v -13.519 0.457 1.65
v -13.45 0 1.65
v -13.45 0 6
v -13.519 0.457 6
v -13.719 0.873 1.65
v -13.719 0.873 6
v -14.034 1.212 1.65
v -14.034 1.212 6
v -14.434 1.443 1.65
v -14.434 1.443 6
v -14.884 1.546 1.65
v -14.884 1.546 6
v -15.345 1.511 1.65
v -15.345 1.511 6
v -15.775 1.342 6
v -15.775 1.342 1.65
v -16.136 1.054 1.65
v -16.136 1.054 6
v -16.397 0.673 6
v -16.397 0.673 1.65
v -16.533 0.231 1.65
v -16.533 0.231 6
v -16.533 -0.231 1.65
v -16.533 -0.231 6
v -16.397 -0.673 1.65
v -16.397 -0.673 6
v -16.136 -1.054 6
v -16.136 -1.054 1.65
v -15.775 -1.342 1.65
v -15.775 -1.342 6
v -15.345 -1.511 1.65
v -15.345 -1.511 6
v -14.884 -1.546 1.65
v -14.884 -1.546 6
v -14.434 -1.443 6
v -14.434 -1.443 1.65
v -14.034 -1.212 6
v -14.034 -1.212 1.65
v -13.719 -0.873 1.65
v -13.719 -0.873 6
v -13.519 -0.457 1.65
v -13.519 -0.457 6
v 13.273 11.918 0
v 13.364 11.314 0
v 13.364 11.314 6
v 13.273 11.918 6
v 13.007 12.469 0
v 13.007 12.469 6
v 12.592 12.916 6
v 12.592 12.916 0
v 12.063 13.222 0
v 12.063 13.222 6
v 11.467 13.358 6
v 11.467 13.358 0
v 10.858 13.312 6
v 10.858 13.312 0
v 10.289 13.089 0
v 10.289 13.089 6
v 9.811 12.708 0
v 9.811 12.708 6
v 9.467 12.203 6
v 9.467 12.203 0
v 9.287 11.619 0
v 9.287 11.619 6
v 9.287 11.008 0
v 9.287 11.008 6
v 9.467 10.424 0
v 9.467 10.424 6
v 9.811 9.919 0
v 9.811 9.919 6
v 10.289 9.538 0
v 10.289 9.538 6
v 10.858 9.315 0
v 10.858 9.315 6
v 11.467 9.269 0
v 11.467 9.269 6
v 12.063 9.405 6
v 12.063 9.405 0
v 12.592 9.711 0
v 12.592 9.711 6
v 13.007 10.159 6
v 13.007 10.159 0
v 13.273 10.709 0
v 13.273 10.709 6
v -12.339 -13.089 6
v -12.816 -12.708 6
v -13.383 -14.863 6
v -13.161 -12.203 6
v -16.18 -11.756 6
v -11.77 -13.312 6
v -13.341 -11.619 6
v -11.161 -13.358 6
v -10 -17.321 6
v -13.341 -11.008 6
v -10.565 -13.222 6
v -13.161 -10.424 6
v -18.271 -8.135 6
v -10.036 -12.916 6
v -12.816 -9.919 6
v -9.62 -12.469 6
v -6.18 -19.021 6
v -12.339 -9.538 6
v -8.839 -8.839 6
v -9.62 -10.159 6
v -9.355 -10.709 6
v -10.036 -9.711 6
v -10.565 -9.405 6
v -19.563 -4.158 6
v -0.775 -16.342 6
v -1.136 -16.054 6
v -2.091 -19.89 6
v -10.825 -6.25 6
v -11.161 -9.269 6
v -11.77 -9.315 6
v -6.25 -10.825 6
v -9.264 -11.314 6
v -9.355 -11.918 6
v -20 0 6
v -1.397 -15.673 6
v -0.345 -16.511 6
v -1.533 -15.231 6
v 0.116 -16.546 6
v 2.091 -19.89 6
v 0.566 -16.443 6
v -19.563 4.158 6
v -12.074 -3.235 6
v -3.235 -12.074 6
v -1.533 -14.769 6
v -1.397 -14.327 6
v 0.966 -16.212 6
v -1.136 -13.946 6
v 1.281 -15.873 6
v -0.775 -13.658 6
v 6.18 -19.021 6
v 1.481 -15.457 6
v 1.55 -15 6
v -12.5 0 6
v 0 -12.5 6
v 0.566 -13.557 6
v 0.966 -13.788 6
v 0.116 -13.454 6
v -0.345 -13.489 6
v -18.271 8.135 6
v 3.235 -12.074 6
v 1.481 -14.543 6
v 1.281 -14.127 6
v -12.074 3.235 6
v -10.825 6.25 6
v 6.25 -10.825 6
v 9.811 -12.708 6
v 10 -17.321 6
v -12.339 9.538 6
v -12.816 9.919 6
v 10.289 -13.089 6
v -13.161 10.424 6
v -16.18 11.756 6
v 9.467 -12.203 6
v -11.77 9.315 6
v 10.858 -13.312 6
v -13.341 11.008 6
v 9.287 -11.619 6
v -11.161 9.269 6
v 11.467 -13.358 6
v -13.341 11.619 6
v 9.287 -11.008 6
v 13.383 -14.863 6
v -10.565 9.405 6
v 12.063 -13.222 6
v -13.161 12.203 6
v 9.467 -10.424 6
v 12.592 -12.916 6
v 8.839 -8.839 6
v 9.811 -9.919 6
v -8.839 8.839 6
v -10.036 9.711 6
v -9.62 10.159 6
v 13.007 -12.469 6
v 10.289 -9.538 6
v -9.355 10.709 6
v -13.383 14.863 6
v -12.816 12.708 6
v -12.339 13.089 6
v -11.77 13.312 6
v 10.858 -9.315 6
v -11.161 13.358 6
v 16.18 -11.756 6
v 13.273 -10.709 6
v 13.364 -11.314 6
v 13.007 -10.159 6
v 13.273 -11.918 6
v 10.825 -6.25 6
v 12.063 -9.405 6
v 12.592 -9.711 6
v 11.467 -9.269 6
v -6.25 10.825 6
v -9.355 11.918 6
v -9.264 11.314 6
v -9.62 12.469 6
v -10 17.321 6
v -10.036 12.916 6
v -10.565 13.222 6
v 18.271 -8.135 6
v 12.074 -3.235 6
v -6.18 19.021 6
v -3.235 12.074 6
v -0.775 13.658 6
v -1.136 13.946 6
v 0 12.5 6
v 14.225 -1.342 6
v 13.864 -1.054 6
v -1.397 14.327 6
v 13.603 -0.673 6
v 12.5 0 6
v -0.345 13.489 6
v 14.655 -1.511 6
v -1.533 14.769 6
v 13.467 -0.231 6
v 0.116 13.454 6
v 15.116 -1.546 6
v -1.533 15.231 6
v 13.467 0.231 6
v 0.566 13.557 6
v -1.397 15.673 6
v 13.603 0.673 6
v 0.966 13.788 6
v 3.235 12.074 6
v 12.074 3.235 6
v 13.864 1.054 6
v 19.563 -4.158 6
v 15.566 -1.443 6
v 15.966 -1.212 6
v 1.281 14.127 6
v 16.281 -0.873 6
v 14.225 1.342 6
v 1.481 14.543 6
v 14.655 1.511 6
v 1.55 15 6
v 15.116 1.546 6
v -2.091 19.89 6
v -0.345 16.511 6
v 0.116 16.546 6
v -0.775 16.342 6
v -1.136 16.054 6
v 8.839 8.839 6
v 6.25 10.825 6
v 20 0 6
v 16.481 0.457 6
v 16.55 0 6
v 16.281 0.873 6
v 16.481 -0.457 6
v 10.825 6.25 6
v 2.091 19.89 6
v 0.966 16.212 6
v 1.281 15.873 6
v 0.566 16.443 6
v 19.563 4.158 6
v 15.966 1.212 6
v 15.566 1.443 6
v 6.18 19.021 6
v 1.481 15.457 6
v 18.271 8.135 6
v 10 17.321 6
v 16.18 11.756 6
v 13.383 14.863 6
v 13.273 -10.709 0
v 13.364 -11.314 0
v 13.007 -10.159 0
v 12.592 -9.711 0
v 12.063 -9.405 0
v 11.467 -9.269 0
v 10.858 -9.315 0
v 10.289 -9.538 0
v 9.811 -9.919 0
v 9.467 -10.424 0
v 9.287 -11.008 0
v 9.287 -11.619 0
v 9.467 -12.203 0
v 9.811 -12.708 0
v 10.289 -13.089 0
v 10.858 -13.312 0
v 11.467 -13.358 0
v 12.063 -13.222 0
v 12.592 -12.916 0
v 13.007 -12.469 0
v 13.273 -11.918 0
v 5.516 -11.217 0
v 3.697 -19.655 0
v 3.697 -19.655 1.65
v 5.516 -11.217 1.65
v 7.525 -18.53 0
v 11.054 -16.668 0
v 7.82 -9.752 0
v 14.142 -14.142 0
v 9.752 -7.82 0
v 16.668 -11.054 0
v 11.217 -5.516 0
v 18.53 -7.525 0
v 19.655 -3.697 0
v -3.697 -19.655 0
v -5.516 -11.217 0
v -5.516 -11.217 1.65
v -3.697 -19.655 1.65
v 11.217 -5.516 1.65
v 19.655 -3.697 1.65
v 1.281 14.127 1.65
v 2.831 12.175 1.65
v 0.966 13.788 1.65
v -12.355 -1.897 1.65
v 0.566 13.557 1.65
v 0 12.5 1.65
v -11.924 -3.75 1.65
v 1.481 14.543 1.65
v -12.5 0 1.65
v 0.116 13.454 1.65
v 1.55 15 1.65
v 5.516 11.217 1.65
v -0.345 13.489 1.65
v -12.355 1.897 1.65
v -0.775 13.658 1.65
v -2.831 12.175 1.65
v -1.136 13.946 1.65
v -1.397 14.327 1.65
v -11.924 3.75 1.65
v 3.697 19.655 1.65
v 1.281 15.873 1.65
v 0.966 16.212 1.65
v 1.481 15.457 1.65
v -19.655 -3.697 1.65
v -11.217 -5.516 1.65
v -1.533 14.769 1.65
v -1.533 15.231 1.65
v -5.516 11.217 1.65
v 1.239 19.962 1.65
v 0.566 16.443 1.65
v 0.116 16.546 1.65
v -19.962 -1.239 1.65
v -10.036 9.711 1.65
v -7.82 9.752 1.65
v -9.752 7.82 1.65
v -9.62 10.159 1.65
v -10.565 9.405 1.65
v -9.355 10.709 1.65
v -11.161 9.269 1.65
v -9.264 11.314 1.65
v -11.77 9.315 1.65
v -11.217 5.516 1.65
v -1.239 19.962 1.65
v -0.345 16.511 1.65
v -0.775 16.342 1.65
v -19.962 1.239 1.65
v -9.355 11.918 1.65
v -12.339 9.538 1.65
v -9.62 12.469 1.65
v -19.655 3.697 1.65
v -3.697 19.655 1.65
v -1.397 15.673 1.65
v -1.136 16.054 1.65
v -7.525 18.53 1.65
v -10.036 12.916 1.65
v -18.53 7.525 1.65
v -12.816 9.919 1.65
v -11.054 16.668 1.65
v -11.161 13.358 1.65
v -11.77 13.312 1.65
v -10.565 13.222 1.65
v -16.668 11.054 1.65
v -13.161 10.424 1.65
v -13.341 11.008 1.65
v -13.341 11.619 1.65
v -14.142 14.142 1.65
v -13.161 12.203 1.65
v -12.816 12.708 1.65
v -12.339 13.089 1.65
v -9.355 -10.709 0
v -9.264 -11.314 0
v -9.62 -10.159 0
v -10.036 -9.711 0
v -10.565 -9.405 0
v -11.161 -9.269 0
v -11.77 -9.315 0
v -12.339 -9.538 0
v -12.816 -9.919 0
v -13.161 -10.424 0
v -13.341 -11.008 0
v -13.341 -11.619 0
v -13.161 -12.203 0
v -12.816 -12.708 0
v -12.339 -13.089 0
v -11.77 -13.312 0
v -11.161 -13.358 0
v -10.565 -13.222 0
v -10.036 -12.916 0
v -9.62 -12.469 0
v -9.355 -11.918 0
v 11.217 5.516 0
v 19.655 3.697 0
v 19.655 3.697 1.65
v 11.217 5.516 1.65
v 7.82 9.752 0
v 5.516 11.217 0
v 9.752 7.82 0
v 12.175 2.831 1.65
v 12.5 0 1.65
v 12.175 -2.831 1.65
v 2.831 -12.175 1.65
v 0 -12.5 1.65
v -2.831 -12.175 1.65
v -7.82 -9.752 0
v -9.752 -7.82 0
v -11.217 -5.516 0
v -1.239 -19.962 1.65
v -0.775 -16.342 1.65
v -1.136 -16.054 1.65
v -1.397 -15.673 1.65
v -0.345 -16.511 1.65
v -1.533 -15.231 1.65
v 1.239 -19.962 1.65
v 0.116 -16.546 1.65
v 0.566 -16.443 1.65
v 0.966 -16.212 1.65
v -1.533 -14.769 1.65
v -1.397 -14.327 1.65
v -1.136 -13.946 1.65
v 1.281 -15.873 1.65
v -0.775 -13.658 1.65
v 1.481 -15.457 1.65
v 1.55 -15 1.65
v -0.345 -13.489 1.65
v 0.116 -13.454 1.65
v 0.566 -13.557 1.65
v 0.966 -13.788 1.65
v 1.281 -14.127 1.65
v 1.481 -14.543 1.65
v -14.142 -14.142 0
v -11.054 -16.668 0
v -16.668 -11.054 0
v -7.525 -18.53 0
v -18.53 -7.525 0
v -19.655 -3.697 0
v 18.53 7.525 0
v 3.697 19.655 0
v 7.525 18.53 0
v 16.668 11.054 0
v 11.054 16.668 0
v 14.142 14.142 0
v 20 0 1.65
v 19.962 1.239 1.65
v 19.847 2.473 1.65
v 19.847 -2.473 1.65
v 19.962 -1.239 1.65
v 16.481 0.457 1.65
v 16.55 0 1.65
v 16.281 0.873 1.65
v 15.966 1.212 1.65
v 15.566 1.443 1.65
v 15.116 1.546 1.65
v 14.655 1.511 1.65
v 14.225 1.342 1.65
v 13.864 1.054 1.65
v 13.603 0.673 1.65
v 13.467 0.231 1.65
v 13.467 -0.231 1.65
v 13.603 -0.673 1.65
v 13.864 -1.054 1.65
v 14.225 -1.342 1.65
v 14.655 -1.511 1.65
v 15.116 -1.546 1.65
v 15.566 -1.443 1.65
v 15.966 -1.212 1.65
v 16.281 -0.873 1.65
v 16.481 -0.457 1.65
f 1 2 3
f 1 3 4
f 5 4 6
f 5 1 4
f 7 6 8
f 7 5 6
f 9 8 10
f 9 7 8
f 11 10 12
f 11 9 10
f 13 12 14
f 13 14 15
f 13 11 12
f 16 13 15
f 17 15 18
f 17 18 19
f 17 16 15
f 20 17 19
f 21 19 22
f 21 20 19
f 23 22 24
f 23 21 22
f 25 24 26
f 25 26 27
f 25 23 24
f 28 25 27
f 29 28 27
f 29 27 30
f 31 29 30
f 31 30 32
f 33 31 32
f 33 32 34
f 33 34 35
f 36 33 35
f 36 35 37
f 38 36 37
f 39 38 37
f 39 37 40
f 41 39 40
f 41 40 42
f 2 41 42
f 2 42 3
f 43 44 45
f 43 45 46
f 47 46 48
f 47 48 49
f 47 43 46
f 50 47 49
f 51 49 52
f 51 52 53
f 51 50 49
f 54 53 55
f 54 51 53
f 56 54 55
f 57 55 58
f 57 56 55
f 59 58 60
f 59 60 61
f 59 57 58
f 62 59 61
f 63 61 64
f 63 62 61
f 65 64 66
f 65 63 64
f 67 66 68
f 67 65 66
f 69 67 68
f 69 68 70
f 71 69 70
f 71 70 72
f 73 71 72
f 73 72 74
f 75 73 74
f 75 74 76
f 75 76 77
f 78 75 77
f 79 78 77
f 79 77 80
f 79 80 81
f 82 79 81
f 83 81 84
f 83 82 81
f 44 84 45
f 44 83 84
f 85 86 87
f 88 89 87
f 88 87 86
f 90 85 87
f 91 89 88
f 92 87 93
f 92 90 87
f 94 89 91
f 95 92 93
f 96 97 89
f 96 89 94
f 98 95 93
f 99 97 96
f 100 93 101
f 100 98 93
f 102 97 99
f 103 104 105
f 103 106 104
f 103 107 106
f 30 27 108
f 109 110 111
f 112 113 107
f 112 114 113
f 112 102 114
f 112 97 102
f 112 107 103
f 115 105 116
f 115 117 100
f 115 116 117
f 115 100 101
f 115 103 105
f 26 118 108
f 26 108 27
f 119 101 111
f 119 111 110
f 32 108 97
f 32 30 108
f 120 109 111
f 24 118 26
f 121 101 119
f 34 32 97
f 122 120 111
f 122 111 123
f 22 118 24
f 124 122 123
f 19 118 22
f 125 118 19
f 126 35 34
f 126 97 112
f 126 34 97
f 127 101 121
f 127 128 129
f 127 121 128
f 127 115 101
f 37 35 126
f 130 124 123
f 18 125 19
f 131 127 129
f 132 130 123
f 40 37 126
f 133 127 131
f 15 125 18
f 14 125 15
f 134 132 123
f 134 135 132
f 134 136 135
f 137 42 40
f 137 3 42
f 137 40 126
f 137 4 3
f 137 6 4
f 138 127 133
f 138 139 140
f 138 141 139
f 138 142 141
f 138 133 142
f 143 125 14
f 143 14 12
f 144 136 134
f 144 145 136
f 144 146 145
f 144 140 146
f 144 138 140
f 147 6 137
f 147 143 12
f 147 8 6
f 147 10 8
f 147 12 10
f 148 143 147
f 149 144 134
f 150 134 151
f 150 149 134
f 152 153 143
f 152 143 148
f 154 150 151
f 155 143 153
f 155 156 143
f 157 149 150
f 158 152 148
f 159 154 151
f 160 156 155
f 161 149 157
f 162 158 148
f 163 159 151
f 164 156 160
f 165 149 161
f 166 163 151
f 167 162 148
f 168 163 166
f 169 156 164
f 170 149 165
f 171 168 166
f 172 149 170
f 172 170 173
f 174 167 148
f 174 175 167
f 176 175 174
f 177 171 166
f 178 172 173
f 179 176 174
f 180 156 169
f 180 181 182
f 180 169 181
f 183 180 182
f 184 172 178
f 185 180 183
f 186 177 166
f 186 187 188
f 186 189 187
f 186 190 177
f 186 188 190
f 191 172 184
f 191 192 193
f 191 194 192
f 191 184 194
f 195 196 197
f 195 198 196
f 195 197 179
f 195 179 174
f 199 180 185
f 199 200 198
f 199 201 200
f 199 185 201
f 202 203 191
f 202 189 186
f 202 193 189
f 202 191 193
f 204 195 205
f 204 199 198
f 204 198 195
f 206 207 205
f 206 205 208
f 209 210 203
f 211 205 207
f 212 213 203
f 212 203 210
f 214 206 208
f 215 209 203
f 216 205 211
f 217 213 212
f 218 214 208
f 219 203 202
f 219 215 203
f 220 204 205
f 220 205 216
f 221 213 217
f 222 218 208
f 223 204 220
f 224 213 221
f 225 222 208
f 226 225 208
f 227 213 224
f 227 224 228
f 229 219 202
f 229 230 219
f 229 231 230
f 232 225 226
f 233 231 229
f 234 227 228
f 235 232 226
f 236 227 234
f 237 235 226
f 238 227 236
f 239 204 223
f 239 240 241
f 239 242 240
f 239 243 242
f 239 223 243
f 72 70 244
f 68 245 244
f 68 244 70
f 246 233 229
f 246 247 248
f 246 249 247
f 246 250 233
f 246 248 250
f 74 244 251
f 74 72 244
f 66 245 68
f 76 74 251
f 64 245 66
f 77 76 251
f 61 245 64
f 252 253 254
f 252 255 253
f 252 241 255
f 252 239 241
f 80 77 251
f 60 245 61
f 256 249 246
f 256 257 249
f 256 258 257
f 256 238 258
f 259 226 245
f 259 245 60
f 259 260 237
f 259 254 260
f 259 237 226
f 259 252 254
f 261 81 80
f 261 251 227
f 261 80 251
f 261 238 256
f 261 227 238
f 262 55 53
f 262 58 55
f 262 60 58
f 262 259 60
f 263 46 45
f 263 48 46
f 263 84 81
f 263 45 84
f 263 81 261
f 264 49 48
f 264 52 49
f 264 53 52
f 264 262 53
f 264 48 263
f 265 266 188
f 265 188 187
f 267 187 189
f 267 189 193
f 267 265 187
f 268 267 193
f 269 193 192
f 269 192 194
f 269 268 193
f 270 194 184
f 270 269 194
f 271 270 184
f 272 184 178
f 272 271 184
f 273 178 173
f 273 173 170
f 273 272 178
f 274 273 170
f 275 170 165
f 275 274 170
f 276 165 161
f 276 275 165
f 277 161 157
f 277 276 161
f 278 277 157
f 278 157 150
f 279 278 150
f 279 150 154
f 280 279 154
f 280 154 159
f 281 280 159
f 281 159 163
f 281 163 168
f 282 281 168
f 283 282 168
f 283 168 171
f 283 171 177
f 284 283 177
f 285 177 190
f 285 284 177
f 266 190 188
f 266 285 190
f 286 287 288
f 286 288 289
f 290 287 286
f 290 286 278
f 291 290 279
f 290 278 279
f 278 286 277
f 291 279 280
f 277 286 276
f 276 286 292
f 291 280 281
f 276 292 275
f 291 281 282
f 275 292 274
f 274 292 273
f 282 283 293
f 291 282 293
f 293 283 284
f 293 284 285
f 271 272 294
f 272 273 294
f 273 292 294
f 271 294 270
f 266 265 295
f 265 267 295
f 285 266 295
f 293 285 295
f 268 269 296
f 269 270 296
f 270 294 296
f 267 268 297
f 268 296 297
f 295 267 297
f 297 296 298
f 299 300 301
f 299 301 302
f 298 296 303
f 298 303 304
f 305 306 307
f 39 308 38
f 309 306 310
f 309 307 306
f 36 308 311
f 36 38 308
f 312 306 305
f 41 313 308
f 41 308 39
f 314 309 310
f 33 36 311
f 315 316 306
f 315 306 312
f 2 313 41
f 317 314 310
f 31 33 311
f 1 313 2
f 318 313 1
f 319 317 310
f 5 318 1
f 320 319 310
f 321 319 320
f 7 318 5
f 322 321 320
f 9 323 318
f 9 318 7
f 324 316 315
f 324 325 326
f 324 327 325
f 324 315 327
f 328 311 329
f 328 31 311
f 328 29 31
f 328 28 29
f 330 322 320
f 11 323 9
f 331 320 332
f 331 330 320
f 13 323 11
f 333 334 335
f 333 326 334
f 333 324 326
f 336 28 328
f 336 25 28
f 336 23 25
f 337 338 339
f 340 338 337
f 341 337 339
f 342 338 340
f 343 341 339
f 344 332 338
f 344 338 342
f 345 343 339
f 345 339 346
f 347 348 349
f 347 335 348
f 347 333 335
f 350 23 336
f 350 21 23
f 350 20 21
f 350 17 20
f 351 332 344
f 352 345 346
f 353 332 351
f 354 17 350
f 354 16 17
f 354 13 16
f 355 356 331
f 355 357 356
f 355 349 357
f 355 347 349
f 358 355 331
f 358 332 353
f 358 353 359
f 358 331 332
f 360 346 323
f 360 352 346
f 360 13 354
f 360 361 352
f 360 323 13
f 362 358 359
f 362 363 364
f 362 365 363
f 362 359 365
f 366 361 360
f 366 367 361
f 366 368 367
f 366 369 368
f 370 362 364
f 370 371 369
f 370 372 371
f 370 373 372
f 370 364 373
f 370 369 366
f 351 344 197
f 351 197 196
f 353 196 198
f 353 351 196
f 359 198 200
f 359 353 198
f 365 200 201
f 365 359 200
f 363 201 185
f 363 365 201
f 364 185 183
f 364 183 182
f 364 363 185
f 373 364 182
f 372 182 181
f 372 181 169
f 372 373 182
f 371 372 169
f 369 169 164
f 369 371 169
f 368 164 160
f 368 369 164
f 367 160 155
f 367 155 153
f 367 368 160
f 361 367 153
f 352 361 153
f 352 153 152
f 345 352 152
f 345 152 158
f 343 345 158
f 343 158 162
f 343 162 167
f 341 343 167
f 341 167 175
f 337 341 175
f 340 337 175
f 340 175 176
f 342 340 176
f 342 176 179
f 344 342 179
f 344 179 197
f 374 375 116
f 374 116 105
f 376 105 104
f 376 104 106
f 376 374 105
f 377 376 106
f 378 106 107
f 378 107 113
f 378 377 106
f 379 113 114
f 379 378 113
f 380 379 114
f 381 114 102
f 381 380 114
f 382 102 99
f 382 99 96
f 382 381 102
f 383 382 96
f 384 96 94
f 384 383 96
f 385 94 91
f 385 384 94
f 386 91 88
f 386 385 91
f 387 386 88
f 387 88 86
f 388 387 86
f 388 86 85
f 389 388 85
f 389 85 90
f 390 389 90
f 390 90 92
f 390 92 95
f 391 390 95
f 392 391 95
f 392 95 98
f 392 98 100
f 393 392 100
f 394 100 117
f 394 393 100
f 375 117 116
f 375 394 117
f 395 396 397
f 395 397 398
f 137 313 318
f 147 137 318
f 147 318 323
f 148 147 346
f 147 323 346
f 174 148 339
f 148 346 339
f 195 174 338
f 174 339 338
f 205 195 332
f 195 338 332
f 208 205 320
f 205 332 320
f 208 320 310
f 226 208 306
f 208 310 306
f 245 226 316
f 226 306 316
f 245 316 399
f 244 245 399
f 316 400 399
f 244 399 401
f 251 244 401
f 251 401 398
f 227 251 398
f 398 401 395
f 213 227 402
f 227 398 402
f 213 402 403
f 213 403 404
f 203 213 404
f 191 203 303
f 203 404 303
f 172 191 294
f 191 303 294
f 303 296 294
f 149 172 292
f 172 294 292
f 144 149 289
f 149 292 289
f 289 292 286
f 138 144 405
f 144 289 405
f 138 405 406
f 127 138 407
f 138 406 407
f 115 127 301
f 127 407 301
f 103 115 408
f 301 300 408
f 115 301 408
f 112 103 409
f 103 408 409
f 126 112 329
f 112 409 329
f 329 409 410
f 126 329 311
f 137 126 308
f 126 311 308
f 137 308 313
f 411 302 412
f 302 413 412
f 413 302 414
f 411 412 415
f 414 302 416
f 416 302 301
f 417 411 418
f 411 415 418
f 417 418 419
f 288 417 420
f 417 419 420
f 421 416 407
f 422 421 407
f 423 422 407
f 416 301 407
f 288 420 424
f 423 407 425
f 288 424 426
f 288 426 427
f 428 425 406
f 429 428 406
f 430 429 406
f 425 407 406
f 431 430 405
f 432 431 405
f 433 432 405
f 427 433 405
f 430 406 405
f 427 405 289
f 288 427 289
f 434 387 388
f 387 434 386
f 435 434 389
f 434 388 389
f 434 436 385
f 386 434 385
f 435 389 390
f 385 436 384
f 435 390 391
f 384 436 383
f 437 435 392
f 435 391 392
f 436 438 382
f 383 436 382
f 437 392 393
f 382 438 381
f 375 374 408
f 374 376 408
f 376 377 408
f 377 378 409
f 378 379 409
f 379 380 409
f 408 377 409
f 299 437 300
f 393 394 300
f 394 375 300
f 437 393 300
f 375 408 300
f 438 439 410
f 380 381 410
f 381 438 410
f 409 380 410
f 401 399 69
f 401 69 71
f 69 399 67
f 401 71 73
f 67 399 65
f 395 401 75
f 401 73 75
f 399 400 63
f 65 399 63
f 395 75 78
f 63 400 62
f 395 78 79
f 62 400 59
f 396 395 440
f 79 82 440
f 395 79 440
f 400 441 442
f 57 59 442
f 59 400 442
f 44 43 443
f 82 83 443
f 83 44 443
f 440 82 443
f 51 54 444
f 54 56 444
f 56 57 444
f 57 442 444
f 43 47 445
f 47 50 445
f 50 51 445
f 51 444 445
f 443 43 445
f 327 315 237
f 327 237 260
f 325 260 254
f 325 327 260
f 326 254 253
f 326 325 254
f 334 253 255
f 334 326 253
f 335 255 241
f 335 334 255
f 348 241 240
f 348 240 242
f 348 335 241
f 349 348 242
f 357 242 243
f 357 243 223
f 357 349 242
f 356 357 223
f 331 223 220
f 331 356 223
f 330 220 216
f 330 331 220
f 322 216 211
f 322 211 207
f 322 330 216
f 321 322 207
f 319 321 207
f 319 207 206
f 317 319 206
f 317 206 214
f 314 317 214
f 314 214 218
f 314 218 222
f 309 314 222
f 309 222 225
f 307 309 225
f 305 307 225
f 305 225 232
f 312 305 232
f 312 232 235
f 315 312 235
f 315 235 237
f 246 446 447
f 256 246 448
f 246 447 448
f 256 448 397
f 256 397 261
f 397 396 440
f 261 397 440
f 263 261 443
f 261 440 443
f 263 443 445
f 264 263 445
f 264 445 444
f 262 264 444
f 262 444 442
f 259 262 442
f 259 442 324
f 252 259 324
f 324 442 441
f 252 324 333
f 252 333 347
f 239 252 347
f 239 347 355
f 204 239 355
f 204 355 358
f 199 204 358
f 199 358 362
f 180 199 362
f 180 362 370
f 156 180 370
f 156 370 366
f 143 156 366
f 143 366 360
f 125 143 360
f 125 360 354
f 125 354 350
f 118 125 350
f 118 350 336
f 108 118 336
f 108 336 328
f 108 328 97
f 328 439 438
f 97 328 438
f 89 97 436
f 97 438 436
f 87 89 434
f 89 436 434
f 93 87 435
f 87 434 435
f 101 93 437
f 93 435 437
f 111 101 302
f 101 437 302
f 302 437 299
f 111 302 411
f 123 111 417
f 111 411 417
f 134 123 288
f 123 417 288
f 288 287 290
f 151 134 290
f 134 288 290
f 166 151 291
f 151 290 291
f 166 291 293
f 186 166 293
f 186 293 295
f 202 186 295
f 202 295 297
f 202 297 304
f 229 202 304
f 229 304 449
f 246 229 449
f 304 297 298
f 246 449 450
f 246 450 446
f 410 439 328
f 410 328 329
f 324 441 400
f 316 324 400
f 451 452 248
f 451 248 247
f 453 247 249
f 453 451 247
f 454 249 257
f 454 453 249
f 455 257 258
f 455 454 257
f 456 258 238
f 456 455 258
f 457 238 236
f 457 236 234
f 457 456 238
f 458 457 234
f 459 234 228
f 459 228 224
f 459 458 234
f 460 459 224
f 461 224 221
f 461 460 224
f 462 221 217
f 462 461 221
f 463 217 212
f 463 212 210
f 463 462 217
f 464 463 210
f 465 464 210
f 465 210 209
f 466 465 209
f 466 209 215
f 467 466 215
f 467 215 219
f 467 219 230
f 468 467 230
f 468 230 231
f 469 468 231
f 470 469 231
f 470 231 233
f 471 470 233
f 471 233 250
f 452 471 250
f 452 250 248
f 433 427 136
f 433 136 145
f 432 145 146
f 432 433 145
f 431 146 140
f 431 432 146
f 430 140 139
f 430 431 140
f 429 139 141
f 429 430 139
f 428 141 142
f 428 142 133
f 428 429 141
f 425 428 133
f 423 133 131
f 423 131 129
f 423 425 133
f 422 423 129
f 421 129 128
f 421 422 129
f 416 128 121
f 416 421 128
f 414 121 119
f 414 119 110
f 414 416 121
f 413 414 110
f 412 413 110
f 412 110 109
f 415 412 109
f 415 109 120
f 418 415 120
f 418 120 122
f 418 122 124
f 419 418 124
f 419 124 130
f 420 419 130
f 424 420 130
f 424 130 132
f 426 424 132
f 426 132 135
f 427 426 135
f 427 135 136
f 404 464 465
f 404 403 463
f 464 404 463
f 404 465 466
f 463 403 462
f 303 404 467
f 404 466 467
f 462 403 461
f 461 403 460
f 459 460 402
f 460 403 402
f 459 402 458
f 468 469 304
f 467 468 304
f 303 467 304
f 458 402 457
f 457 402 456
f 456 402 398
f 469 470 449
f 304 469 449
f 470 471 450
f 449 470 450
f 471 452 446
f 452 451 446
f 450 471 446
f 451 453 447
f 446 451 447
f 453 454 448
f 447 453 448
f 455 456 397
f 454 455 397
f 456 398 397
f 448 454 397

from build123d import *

# Parameters (mm, degrees)
SKETCH_1_R          = 20
SKETCH_1_R_2        = 1.55
SKETCH_1_R_3        = 2.05
EXTRUDE_1_DEPTH     = 6
SKETCH_2_R          = 12.5
CUT_EXTRUDE_1_DEPTH = 31
CUT_EXTRUDE_2_DEPTH = 1.65
CUT_EXTRUDE_3_DEPTH = 1.65


with BuildPart() as part:
    # 草图1 → 凸台-拉伸1 (new body)
    with BuildSketch(Plane.XY):
        Circle(SKETCH_1_R)
        with Locations((0, 15)):
            Circle(SKETCH_1_R_2, mode=Mode.SUBTRACT)
        with Locations((15, 0)):
            Circle(SKETCH_1_R_2, mode=Mode.SUBTRACT)
        with Locations((0, -15)):
            Circle(SKETCH_1_R_2, mode=Mode.SUBTRACT)
        with Locations((-15, 0)):
            Circle(SKETCH_1_R_2, mode=Mode.SUBTRACT)
        with Locations((-11.313708499, 11.313708499)):
            Circle(SKETCH_1_R_3, mode=Mode.SUBTRACT)
        with Locations((11.313708499, 11.313708499)):
            Circle(SKETCH_1_R_3, mode=Mode.SUBTRACT)
        with Locations((11.313708499, -11.313708499)):
            Circle(SKETCH_1_R_3, mode=Mode.SUBTRACT)
        with Locations((-11.313708499, -11.313708499)):
            Circle(SKETCH_1_R_3, mode=Mode.SUBTRACT)
    extrude(amount=EXTRUDE_1_DEPTH)

    # 草图2 → 切除-拉伸1 (cut)
    with BuildSketch(Plane(origin=(0, 0, 0), x_dir=(-1, 0, 0), z_dir=(0, 0, -1))):
        Circle(SKETCH_2_R)
    extrude(amount=-CUT_EXTRUDE_1_DEPTH, mode=Mode.SUBTRACT)

    # 草图4 → 切除-拉伸2 (cut)
    with BuildSketch(Plane(origin=(0, 0, 0), x_dir=(-1, 0, 0), z_dir=(0, 0, -1))):
        with BuildLine():
            Line((-3.697159098, 19.655304999), (-5.515511779, 11.217358415))
            ThreePointArc((-5.515511779, 11.217358415), (0, 12.5), (5.515511779, 11.217358415))
            Line((5.515511779, 11.217358415), (3.697159098, 19.655304999))
            ThreePointArc((3.697159098, 19.655304999), (0, 20), (-3.697159098, 19.655304999))
        make_face()
        with BuildLine():
            Line((19.655304999, -3.697159098), (11.217358415, -5.515511779))
            ThreePointArc((11.217358415, -5.515511779), (12.5, 0), (11.217358415, 5.515511779))
            Line((11.217358415, 5.515511779), (19.655304999, 3.697159098))
            ThreePointArc((19.655304999, 3.697159098), (20, 0), (19.655304999, -3.697159098))
        make_face()
        with BuildLine():
            Line((-3.697159098, -19.655304999), (-5.515511779, -11.217358415))
            ThreePointArc((-5.515511779, -11.217358415), (0, -12.5), (5.515511779, -11.217358415))
            Line((5.515511779, -11.217358415), (3.697159098, -19.655304999))
            ThreePointArc((3.697159098, -19.655304999), (0, -20), (-3.697159098, -19.655304999))
        make_face()
        with BuildLine():
            Line((-19.655304999, 3.697159098), (-11.217358415, 5.515511779))
            ThreePointArc((-11.217358415, 5.515511779), (-12.5, 0), (-11.217358415, -5.515511779))
            Line((-11.217358415, -5.515511779), (-19.655304999, -3.697159098))
            ThreePointArc((-19.655304999, -3.697159098), (-20, 0), (-19.655304999, 3.697159098))
        make_face()
    extrude(amount=-CUT_EXTRUDE_2_DEPTH, mode=Mode.SUBTRACT)

    # 草图5 → 切除-拉伸3 (cut)
    with BuildSketch(Plane(origin=(0, 0, 0), x_dir=(-1, 0, 0), z_dir=(0, 0, -1))):
        with BuildLine():
            Line((3.697159098, 19.655304999), (5.515511779, 11.217358415))
            ThreePointArc((5.515511779, 11.217358415), (8.838834765, 8.838834765), (11.217358415, 5.515511779))
            Line((11.217358415, 5.515511779), (19.655304999, 3.697159098))
            ThreePointArc((19.655304999, 3.697159098), (14.142135624, 14.142135624), (3.697159098, 19.655304999))
        make_face()
    extrude(amount=-CUT_EXTRUDE_3_DEPTH, mode=Mode.SUBTRACT)


solid = part.part
